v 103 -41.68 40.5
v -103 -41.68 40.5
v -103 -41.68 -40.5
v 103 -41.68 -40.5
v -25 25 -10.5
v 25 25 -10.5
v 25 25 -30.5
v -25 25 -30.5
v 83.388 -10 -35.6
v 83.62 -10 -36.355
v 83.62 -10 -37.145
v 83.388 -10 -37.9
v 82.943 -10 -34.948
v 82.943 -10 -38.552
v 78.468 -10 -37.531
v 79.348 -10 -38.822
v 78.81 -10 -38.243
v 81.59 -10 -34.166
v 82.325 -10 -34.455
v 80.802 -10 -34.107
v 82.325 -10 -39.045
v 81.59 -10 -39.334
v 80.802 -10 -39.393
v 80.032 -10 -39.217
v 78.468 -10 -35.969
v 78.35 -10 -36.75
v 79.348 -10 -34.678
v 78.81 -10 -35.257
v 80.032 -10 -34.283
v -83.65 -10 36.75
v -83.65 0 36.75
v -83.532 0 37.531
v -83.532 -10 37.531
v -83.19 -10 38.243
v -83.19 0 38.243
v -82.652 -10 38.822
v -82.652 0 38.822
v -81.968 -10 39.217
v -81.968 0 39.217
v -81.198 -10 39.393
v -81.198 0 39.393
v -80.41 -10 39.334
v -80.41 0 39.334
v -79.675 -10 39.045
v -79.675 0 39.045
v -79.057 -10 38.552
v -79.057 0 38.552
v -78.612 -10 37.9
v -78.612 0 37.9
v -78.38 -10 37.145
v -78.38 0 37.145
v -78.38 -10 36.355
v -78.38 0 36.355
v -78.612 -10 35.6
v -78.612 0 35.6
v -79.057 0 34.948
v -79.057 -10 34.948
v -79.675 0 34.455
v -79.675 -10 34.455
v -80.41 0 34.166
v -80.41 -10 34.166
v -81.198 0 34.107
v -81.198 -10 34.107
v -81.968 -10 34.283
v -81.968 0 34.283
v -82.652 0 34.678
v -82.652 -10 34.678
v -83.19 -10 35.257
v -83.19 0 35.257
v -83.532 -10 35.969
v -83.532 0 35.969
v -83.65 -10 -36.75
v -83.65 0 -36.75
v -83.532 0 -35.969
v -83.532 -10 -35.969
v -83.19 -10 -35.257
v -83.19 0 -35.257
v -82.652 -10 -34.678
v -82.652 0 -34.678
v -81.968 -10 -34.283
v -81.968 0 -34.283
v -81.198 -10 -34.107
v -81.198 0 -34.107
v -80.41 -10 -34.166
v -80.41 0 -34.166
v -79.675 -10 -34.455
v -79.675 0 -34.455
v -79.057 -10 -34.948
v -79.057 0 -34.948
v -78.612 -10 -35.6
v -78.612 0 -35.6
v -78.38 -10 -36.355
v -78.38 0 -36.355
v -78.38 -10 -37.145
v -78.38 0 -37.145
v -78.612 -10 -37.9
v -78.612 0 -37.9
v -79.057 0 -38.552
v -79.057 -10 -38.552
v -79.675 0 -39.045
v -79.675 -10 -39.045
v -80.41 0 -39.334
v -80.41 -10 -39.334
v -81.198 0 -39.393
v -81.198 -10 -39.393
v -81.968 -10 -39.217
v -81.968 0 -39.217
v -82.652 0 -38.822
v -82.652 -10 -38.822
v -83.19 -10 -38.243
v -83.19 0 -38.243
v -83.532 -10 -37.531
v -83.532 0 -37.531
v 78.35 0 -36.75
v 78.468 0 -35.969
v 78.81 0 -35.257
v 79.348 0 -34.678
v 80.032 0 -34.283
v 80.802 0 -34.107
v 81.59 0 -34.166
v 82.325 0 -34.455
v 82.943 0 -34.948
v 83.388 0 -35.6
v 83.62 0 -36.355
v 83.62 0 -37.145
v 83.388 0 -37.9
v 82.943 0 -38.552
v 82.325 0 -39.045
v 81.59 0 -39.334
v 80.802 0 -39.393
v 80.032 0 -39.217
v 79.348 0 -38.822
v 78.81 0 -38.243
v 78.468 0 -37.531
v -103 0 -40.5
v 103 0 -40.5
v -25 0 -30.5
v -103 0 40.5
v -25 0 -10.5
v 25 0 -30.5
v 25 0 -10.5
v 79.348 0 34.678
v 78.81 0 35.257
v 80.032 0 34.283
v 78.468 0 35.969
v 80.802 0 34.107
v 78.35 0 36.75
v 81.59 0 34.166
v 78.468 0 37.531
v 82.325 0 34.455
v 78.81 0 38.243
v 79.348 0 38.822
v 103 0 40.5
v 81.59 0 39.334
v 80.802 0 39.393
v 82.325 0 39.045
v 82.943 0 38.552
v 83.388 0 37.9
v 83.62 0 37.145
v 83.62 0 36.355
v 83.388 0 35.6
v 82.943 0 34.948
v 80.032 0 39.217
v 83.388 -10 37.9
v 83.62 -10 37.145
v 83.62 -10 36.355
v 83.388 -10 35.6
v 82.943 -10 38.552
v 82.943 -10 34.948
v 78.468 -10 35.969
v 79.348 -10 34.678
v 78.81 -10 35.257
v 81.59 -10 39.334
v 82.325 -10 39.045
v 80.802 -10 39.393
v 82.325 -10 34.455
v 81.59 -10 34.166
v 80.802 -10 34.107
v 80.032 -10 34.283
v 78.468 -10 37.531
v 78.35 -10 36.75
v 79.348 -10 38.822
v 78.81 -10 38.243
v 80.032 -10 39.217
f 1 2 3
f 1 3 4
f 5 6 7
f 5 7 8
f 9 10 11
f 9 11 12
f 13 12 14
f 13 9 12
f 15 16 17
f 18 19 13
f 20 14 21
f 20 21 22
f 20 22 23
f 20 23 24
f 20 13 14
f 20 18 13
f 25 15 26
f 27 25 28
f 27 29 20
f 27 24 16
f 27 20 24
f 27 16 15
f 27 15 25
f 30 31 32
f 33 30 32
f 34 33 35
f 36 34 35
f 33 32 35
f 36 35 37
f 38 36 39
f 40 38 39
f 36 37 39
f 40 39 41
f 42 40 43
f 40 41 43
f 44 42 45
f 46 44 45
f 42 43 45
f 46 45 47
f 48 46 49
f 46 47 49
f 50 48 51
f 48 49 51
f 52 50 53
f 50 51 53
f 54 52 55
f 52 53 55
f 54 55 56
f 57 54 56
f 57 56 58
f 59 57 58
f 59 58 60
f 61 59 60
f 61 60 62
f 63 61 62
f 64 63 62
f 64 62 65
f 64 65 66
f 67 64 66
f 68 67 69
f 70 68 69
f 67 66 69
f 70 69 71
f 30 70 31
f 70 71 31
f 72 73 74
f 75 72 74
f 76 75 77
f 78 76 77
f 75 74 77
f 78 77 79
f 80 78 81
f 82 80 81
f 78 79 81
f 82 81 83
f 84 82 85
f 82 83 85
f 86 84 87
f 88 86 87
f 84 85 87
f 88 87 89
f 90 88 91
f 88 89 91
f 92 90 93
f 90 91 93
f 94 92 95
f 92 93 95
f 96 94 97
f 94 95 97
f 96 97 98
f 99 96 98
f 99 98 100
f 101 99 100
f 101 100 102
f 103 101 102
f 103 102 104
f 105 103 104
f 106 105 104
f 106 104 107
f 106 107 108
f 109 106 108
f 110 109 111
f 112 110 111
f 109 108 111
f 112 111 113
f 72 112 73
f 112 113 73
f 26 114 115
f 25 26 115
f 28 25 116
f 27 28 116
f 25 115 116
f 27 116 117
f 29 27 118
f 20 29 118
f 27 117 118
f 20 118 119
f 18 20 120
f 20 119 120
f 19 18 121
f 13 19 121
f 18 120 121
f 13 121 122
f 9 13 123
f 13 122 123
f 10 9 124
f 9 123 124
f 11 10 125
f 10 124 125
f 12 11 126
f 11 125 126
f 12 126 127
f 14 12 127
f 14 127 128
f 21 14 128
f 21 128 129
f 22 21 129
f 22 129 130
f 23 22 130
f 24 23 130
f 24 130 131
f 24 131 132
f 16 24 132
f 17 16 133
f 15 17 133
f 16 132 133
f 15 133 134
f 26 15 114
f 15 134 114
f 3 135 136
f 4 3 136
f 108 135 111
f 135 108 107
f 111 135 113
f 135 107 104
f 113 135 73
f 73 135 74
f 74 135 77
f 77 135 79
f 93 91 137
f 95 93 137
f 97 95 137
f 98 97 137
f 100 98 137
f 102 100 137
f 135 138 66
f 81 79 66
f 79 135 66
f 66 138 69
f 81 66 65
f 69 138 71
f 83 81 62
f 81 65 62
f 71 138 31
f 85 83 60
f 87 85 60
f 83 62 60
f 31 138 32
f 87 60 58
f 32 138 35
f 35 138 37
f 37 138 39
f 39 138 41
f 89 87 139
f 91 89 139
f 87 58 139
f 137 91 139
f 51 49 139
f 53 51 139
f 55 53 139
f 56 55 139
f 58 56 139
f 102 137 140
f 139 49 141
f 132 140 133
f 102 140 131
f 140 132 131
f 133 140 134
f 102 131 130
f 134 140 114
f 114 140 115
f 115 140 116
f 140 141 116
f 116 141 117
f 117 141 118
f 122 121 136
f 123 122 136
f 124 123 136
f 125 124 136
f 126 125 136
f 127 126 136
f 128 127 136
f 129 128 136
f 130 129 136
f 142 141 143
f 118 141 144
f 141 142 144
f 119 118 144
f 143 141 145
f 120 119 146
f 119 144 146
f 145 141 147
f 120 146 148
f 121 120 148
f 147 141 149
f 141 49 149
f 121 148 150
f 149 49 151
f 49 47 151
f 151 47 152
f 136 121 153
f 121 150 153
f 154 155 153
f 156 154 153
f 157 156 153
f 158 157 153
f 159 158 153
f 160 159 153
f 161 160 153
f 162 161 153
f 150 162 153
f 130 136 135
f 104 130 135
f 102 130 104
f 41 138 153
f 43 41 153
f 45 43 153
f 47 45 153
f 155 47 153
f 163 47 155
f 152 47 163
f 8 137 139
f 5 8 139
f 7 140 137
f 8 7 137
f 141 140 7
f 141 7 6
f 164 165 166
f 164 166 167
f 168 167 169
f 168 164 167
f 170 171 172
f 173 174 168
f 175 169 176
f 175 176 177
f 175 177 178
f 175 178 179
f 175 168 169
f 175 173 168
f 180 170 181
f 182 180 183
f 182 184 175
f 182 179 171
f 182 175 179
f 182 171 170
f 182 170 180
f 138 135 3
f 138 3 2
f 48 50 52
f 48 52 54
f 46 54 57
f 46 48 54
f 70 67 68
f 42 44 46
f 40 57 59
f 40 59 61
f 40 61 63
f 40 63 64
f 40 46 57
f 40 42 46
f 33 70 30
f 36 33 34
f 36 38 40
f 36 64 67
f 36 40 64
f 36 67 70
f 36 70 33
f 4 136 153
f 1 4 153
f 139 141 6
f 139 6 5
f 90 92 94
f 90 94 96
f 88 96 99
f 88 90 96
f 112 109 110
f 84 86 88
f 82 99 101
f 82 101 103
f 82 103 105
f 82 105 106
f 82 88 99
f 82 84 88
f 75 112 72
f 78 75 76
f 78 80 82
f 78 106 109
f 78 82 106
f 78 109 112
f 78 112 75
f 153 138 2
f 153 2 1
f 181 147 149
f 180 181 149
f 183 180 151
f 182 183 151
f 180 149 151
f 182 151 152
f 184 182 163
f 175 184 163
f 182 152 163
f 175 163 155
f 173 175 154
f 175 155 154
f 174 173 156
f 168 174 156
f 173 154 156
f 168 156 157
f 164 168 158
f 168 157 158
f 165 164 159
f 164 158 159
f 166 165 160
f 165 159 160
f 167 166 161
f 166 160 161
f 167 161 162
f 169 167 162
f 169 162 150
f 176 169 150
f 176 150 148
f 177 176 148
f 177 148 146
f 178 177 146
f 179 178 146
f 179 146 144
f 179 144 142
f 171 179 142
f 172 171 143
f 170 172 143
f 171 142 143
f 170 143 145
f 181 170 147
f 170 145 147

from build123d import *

# Parameters (mm, degrees)
F0_W     = 206
F0_H     = 81
F1_DEPTH = 41.68
F2_R     = 2.65
F3_DEPTH = 10
F4_W     = 50
F4_H     = 20
F5_DEPTH = 25


with BuildPart() as f1:
    # F0 (on Front) → F1 (new body)
    with BuildSketch(Plane.XZ):
        Rectangle(F0_W, F0_H)
    extrude(amount=F1_DEPTH)

    # F2 (on face) → F3 (cut)
    with BuildSketch(Plane(origin=(0, 0, 0), x_dir=(-1, 0, 0), z_dir=(0, 1, 0))):
        with Locations((-81, 36.75)):
            Circle(F2_R)
        with Locations((-81, -36.75)):
            Circle(F2_R)
        with Locations((81, -36.75)):
            Circle(F2_R)
        with Locations((81, 36.75)):
            Circle(F2_R)
    extrude(amount=-F3_DEPTH, mode=Mode.SUBTRACT)

    # F4 (on face) → F5 (join)
    with BuildSketch(Plane(origin=(0, 0, 0), x_dir=(-1, 0, 0), z_dir=(0, 1, 0))):
        with Locations((0, -20.5)):
            Rectangle(F4_W, F4_H)
    extrude(amount=F5_DEPTH)


solid = f1.part
